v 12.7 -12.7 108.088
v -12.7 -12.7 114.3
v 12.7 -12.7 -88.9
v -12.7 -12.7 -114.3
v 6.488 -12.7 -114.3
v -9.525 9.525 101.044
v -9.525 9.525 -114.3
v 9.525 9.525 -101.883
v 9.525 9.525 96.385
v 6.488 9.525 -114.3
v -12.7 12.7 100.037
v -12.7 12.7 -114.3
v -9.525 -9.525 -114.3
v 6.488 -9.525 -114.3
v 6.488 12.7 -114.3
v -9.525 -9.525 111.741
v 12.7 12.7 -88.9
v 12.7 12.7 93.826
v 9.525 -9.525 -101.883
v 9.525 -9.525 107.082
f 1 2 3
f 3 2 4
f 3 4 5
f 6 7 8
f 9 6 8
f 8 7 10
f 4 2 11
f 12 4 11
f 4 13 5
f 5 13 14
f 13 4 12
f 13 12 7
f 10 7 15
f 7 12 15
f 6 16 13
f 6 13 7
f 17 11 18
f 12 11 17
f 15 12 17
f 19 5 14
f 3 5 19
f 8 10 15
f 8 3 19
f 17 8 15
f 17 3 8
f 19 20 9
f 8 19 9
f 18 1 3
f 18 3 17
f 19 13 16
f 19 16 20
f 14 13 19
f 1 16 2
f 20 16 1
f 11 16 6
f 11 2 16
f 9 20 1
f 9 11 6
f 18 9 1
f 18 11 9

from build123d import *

# Parameters (mm, degrees)
BOSS_EXTRUDE1_DEPTH      = 114.3
BOSS_EXTRUDE1_DEPTH_BACK = 114.3
SKETCH3_W                = 25.4
SKETCH3_H                = 25.4
SKETCH3_W_2              = 19.05
SKETCH3_H_2              = 19.05


with BuildPart() as part:
    # Sketch3 → Boss-Extrude1 (new, two sides: drawn at the far end of the back side and taken through both)
    with BuildSketch(Plane.XY.offset(-BOSS_EXTRUDE1_DEPTH_BACK)):
        Rectangle(SKETCH3_W, SKETCH3_H)
        Rectangle(SKETCH3_W_2, SKETCH3_H_2, mode=Mode.SUBTRACT)
    extrude(amount=BOSS_EXTRUDE1_DEPTH + BOSS_EXTRUDE1_DEPTH_BACK)

    # SurfaceCut2
    split(bisect_by=Plane(origin=(18.506664542, 42.493539826, 75.67626096), x_dir=(0.9713752475559996, 0, -0.2375502650714591), z_dir=(0.20854523863616634, 0.47884508758591265, 0.8527697611530466)), keep=Keep.BOTTOM)

    # SurfaceCut4
    split(bisect_by=Plane(origin=(32.497052155, 0, -7.947169102), x_dir=(0, 1, 0), z_dir=(0.9713752475559998, 0, -0.23755026507145854)), keep=Keep.BOTTOM)


solid = part.part
